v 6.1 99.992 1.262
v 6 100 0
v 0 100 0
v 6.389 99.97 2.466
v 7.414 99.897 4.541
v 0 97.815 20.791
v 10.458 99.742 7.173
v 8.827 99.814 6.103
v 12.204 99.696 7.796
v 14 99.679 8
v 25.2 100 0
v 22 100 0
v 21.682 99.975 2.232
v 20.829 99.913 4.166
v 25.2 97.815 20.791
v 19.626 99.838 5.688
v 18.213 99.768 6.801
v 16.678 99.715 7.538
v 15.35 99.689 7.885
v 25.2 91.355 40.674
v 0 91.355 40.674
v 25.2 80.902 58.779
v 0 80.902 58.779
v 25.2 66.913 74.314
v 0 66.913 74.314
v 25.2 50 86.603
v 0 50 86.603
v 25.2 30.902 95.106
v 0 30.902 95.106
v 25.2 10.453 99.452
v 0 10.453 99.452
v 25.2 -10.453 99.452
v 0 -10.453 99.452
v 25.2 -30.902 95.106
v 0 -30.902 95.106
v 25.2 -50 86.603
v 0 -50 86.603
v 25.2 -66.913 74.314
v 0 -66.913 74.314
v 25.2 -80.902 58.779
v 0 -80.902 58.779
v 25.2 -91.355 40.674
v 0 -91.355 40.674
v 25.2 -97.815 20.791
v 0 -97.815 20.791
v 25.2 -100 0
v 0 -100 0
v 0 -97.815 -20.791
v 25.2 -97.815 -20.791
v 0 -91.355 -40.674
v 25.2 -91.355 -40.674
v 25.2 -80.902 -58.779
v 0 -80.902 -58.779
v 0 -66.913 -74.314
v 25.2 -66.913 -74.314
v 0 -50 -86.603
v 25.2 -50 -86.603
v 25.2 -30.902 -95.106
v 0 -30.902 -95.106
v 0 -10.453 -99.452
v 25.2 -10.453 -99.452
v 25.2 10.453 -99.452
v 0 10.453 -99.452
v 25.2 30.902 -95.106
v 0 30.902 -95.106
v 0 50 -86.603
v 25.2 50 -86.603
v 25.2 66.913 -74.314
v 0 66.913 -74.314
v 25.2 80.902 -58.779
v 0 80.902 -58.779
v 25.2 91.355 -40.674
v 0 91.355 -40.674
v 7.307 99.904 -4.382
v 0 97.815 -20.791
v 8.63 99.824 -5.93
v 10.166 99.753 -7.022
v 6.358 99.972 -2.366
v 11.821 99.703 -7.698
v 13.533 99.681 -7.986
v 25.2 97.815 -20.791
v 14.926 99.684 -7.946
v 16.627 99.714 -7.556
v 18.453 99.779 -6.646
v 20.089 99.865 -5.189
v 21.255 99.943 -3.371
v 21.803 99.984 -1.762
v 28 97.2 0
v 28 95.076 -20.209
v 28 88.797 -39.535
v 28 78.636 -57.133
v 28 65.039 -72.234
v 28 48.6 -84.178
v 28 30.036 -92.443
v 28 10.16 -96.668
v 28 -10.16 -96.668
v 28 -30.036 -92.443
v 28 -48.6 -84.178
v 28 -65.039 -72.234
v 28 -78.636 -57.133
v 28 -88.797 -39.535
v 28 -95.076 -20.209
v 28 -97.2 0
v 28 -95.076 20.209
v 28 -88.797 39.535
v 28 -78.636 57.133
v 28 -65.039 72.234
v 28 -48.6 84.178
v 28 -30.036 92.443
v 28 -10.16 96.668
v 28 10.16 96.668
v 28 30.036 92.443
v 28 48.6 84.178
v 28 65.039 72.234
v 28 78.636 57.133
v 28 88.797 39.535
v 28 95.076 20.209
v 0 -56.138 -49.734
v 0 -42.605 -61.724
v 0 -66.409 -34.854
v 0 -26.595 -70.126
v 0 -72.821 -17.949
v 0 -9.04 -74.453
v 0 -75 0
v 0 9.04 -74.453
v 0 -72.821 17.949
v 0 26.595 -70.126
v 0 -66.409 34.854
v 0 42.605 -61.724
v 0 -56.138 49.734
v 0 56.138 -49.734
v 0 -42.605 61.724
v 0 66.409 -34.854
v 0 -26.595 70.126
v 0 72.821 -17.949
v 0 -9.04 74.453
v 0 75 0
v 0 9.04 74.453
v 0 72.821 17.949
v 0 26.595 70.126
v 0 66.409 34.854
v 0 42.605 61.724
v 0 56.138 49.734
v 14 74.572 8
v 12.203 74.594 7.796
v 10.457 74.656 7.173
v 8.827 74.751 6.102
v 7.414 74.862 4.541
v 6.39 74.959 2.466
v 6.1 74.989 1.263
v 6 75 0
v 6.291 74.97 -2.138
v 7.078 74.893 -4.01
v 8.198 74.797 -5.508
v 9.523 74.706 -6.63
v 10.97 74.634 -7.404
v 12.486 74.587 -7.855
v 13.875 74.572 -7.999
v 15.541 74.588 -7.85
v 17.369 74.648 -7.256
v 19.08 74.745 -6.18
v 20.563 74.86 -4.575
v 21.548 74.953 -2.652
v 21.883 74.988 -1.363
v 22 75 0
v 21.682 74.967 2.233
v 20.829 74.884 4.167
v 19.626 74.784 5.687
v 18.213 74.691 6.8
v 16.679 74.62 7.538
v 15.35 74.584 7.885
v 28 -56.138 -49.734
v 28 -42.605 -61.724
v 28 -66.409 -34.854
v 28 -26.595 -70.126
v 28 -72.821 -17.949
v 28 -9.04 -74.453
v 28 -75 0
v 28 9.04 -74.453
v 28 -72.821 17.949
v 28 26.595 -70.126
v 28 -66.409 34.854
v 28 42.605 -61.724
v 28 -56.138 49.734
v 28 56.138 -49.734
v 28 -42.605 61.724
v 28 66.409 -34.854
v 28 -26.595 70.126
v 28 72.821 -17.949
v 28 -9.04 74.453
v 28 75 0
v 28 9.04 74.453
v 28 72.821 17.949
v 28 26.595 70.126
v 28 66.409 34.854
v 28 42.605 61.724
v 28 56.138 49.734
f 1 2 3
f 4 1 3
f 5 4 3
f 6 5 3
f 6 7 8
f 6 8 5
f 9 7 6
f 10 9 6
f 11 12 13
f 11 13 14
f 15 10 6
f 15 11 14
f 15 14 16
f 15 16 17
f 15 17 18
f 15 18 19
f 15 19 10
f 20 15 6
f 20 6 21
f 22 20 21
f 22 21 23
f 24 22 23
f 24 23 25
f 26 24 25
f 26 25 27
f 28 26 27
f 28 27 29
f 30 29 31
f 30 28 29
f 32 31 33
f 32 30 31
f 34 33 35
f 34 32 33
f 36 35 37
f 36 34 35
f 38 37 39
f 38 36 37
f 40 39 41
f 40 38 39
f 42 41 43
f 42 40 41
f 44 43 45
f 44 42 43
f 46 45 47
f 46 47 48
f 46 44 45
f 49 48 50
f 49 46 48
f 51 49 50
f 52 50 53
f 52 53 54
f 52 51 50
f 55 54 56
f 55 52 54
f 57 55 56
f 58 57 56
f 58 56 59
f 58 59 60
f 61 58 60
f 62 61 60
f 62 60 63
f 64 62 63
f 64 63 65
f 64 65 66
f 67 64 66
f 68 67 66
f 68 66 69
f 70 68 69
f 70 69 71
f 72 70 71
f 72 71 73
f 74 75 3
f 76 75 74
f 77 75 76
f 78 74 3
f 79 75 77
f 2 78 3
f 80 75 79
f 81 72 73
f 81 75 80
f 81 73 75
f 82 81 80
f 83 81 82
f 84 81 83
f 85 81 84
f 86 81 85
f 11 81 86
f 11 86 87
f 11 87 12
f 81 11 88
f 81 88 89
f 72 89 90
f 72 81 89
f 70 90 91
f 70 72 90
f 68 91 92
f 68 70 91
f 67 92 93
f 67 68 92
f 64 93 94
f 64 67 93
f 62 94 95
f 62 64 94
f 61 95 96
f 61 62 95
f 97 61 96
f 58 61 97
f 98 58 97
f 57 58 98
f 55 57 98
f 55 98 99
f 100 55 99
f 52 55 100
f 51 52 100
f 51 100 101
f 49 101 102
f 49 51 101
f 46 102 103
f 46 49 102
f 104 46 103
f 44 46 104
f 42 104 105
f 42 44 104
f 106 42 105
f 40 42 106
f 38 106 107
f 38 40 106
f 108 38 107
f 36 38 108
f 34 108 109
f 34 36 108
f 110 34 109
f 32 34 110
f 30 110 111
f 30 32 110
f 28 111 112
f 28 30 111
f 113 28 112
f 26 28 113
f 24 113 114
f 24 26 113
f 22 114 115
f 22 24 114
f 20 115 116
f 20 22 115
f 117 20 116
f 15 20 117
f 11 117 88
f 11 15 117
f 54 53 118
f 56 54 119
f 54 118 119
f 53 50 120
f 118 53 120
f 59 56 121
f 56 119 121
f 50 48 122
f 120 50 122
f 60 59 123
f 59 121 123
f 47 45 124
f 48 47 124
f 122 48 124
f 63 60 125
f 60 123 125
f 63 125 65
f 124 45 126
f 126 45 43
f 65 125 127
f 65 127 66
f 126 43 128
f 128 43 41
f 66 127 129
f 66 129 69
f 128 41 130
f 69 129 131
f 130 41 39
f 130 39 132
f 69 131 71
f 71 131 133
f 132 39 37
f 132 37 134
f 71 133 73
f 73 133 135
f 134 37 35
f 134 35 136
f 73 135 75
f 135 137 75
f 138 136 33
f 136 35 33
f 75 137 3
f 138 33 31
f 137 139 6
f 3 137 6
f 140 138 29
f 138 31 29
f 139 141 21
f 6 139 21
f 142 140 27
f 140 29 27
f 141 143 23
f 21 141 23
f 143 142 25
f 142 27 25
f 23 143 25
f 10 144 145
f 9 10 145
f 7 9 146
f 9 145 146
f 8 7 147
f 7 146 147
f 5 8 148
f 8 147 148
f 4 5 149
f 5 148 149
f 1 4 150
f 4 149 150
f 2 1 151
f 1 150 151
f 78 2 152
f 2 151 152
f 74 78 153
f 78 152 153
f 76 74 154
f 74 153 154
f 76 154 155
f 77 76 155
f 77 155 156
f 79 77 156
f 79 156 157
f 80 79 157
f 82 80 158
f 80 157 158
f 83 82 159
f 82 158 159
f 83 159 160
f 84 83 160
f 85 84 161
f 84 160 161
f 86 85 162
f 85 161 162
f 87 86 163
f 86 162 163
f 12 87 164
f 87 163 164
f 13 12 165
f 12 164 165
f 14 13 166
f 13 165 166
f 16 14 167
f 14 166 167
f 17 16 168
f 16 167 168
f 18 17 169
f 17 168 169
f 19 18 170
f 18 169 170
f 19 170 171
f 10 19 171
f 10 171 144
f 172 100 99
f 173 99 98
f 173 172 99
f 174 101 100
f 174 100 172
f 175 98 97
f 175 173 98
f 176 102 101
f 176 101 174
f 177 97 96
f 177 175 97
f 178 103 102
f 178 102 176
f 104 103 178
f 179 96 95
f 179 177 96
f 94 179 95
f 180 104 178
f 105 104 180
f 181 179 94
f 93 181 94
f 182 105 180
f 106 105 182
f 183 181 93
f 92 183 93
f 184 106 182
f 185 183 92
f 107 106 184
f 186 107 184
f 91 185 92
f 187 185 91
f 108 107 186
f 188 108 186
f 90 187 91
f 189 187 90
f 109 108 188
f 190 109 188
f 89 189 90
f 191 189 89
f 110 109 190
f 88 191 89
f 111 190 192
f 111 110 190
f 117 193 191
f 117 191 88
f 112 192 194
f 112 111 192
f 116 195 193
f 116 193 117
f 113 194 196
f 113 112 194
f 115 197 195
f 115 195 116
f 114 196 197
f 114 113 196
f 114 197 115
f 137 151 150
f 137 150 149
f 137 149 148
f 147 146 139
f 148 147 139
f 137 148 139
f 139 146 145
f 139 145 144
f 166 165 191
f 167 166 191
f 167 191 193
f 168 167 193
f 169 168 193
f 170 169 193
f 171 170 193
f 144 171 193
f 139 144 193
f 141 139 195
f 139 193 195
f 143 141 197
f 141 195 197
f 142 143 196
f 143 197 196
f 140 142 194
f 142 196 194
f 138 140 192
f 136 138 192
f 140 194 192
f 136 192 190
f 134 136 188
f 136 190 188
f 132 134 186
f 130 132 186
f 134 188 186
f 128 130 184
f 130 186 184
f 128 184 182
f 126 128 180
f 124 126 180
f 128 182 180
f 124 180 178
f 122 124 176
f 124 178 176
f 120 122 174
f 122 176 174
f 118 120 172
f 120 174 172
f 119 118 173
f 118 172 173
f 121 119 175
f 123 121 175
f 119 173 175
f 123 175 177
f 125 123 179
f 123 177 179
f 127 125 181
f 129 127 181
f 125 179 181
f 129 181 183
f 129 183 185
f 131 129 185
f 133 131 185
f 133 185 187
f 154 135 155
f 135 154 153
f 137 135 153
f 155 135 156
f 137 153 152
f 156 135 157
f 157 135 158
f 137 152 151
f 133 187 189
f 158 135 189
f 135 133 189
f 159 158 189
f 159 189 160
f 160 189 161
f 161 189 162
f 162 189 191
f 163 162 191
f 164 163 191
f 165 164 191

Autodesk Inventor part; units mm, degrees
ref_plane "YZ Plane" through (0, 0, 0) normal (1, 0, 0) x (0, 1, 0)
ref_plane "XZ Plane" through (0, 0, 0) normal (0, 1, 0) x (-1, 0, 0)
sketch "Szkic1" plane through (0, 0, 0) normal (0, 0, 1) x (1, 0, 0)
  line L0 (0, 100) -> (28, 100)
  line L1 (-1.9497, 0) -> (21.5466, 0)
  line L2 (0, 100) -> (0, 75)
  line L3 (0, 75) -> (28, 75)
  line L4 (28, 75) -> (28, 100)
  line L5 (-6.6489, 0) -> (26.2458, 0) projected
  line L6 (0, 48) -> (0, -8) projected
  dimension "d0" = 200
  dimension "d1" = 150
  dimension "d2" = 28
revolve "Bryła" add sketch "Szkic1" angle 360 about axis through (-1.9497, 0, 0) along (1, 0, 0)
ref_plane "IDS_WORKPLANE{1}" through (0, 100, 0) normal (0, 1, 0) x (-1, 0, 0)
sketch "Szkic2" plane through (0, 100, 0) normal (0, 1, 0) x (-1, 0, 0)
  line L0 (0, 100) -> (0, -100) projected
  line L1 (-10.8, 0) -> (1.8, 0) projected
  point P0 (-14, 0)
  dimension "d7" = 14
hole "Otwór1" at (14, 100, 0) direction (0, -1, 0) diameter 16 end up to surface
chamfer "Faza1" distance 2.8 angle 45 1 edges at (28, -100, 0) measured on face at (9.3333, 87.1784, -48.989)
equation "\"d7\" = 0.5 * SD"
equation "\"d8\" = NND"
equation "\"d4\" = PHH"
equation "\"d5\" = FAWI"
equation "\"d22\" = PHH"
equation "\"d0\" = SD2"
equation "\"d1\" = WND"
equation "\"d2\" = SD"
equation "\"WND\" = 150"
equation "\"SD2\" = 200"
equation "\"SD\" = 28"
equation "\"NND\" = 16"
equation "\"FAWI\" = 45deg"
equation "\"PHH\" = 2.8"
properties part number "DIN 705 - B150" material "Stal, miękka"
